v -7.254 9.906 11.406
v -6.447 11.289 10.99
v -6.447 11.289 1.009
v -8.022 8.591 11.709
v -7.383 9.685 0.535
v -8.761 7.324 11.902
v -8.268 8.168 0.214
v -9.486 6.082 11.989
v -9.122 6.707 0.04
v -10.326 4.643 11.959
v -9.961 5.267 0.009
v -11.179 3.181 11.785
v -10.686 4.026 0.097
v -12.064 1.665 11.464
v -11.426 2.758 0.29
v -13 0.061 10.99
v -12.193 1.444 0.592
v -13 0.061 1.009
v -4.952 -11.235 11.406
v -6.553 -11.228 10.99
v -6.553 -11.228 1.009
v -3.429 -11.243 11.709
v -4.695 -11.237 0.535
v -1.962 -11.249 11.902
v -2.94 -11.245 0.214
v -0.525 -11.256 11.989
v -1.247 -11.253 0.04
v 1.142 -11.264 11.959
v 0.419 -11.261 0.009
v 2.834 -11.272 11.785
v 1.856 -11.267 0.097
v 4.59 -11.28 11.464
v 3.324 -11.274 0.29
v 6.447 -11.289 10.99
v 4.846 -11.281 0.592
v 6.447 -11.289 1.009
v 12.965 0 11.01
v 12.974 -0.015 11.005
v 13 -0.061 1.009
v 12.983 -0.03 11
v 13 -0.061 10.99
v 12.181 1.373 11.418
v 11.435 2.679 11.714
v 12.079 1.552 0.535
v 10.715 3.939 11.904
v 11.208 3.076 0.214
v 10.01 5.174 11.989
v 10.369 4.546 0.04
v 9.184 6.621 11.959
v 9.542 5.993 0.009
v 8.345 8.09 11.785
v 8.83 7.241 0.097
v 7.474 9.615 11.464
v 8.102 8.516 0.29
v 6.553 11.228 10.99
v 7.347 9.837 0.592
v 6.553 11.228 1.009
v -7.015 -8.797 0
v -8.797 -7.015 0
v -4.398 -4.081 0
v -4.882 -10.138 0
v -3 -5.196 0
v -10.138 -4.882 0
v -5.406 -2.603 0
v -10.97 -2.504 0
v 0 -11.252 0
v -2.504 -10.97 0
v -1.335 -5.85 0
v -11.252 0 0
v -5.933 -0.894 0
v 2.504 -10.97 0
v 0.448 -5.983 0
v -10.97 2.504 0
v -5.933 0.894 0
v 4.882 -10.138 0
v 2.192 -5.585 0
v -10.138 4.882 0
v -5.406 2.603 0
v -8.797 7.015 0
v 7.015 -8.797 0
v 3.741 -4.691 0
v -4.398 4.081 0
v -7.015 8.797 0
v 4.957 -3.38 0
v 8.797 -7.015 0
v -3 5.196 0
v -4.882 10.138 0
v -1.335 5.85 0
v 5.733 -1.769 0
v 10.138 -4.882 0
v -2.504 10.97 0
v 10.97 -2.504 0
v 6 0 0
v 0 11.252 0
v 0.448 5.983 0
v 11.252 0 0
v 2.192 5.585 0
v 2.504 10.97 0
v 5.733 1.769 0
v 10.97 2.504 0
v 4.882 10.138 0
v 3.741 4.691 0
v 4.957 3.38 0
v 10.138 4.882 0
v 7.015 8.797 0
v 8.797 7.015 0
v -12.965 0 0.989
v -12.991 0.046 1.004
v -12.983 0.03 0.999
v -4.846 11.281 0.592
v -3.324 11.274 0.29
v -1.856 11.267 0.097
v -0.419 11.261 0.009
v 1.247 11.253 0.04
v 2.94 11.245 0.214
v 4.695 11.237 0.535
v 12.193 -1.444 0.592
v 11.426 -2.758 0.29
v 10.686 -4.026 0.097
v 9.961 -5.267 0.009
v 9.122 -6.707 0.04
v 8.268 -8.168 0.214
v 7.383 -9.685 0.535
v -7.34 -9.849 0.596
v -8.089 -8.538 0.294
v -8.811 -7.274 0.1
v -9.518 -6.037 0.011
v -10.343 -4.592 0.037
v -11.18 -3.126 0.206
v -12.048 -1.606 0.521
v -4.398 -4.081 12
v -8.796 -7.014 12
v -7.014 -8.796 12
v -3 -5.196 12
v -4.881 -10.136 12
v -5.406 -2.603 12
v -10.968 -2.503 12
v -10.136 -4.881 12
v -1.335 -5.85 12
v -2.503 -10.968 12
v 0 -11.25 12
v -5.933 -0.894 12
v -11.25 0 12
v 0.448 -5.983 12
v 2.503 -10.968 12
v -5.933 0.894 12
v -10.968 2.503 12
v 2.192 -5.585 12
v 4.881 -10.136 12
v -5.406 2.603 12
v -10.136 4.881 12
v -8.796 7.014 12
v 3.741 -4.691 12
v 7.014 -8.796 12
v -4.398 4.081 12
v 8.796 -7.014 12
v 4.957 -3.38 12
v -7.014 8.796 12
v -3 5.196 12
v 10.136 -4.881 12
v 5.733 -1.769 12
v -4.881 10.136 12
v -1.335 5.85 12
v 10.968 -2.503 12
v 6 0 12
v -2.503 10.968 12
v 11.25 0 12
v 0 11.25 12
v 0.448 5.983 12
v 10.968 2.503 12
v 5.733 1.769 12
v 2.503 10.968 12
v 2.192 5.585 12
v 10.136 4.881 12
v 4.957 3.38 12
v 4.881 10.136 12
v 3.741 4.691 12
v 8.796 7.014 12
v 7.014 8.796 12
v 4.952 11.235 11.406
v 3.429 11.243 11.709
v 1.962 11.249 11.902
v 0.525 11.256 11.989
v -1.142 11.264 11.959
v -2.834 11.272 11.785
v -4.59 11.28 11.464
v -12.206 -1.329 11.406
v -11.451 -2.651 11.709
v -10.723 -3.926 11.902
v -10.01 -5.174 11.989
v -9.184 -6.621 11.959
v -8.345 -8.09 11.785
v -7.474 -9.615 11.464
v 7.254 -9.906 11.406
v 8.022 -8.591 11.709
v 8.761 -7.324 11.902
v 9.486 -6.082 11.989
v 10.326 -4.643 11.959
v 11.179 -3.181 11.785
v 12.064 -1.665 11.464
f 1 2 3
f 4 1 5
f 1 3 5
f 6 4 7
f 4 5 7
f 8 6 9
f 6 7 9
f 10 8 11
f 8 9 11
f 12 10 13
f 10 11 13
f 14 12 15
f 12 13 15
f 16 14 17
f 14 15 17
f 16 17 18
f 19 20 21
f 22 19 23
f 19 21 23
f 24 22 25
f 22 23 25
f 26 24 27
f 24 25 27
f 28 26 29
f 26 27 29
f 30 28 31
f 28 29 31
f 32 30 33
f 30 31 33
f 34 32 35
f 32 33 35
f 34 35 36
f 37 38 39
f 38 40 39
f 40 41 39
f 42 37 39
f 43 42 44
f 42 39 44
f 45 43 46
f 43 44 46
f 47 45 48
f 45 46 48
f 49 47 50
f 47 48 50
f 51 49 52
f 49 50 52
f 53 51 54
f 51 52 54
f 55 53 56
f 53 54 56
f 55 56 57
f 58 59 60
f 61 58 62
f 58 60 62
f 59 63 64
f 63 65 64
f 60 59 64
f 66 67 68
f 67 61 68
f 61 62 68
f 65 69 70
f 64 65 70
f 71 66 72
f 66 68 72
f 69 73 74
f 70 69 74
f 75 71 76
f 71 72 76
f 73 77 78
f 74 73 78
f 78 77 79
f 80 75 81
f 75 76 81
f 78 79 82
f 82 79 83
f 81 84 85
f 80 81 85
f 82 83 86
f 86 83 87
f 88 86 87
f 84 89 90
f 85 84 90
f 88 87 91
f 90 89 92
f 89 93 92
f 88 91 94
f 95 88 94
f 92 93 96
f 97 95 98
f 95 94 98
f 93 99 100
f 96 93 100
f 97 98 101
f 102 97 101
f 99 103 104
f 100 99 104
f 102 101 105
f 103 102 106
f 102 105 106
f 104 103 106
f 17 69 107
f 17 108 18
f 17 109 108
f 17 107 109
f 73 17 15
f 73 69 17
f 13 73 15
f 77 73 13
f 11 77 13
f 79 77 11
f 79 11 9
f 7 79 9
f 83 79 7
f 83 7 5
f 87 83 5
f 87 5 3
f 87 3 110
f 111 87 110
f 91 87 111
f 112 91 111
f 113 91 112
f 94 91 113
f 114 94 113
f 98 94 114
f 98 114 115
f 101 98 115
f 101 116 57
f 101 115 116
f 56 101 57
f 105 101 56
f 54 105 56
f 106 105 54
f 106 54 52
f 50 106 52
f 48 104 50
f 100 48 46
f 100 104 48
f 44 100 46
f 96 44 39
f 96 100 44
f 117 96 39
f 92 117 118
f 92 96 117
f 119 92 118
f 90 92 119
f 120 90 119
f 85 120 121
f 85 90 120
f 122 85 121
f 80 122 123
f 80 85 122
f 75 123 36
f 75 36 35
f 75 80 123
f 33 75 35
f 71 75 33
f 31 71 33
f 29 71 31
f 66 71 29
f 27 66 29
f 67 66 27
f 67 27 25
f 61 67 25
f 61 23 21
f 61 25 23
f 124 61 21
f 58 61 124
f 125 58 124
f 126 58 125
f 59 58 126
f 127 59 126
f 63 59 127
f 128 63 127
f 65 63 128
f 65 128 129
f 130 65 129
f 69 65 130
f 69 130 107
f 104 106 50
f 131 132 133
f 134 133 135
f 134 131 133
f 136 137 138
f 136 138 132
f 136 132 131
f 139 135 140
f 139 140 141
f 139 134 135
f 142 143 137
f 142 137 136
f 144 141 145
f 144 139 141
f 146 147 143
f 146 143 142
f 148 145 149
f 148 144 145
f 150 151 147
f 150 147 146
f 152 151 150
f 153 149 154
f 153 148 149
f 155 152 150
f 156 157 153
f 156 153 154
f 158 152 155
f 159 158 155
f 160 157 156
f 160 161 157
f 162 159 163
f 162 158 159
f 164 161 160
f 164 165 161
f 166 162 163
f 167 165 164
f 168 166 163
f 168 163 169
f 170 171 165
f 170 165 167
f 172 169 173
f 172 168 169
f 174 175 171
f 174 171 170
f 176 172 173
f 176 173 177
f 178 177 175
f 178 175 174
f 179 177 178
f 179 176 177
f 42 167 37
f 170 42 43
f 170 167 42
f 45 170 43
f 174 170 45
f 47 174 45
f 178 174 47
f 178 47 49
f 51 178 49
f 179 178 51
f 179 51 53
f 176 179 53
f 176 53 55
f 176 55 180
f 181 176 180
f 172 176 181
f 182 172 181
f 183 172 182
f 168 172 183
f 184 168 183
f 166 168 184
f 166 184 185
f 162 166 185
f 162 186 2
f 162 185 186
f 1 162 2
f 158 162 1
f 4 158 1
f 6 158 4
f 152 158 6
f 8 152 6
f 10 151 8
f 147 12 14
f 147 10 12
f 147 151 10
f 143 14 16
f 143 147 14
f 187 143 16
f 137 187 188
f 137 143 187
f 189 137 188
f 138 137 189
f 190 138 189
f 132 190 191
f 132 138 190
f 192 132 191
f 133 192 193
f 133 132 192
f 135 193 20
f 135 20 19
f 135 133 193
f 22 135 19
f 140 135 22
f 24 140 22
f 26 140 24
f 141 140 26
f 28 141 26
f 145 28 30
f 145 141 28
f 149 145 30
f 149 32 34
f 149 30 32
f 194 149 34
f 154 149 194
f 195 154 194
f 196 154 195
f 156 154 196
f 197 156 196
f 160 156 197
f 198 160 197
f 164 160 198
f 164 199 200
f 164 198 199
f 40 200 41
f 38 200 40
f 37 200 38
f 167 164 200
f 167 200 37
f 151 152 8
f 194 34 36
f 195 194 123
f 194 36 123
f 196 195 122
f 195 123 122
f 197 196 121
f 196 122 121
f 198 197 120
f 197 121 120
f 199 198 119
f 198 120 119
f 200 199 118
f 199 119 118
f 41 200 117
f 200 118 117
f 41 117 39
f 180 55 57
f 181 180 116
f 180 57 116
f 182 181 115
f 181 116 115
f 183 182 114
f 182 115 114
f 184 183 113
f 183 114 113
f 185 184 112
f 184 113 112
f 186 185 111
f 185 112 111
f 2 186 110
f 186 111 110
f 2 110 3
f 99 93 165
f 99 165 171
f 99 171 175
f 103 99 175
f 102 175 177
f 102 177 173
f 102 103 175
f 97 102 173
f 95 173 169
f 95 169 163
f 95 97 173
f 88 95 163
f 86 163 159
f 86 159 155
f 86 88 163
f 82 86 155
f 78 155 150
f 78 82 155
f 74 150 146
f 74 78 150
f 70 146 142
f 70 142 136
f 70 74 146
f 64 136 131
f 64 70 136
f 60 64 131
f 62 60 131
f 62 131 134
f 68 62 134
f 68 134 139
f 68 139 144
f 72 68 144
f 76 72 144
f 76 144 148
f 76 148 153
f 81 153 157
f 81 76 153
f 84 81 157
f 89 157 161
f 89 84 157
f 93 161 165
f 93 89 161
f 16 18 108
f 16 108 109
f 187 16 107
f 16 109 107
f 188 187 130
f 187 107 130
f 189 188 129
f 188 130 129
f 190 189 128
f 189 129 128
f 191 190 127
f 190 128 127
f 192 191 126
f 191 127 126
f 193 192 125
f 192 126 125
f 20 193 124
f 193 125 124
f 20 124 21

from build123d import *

# Parameters (mm, degrees)
SKETCH1_R           = 6
BOSS_EXTRUDE1_DEPTH = 12
SKETCH2_OUTSIDE_W   = 111.456
SKETCH2_OUTSIDE_H   = 108.034
SKETCH2_OUTSIDE_R   = 11.251897502
CUT_EXTRUDE1_DEPTH  = 21.986591899
CUT_EXTRUDE1_DRAFT  = -60
SKETCH3_OUTSIDE_W   = 111.456
SKETCH3_OUTSIDE_H   = 108.034
SKETCH3_OUTSIDE_R   = 11.25
CUT_EXTRUDE3_DEPTH  = 21.986591899
CUT_EXTRUDE3_DRAFT  = -60


with BuildPart() as part:
    # Sketch1 → Boss-Extrude1 (new body)
    with BuildSketch(Plane.XY):
        Polygon((6.552777772, 11.227858989), (-6.447222228, 11.28880151), (-13, 0.060942521), (-6.552777772, -11.227858989), (6.447222228, -11.28880151), (13, -0.060942521), align=None)
        Circle(SKETCH1_R, mode=Mode.SUBTRACT)
    extrude(amount=BOSS_EXTRUDE1_DEPTH)


with BuildPart() as cut_extrude1_tool:
    # Sketch2 outside → Cut-Extrude1 (with draft: the straight prism first)
    with BuildSketch(Plane(origin=(0, 0, 0), x_dir=(-1, 0, 0), z_dir=(0, 0, -1))):
        Rectangle(SKETCH2_OUTSIDE_W, SKETCH2_OUTSIDE_H)
        Circle(SKETCH2_OUTSIDE_R, mode=Mode.SUBTRACT)
    extrude(amount=-CUT_EXTRUDE1_DEPTH)
    # Cut-Extrude1: the draft: its side faces are tilted about the plane it starts from
    cut_extrude1_sides = [cut_extrude1_tool.faces().sort_by_distance(p)[0] for p in [
        (0, -54.017, 10.993295949),
        (-55.728, 0, 10.993295949),
        (0, 54.017, 10.993295949),
        (55.728, 0, 10.993295949),
        (11.251897502, 0, 10.993295949),
    ]]
    draft(cut_extrude1_sides, Plane(origin=(0, 0, 0), x_dir=(-1, 0, 0), z_dir=(0, 0, -1)), CUT_EXTRUDE1_DRAFT)


with BuildPart() as part_1:
    add(part.part)

    # Cut-Extrude1: cut by cut_extrude1_tool
    add(cut_extrude1_tool.part, mode=Mode.SUBTRACT)


with BuildPart() as cut_extrude3_tool:
    # Sketch3 outside → Cut-Extrude3 (with draft: the straight prism first)
    with BuildSketch(Plane.XY.offset(12)):
        Rectangle(SKETCH3_OUTSIDE_W, SKETCH3_OUTSIDE_H)
        Circle(SKETCH3_OUTSIDE_R, mode=Mode.SUBTRACT)
    extrude(amount=-CUT_EXTRUDE3_DEPTH)
    # Cut-Extrude3: the draft: its side faces are tilted about the plane it starts from
    cut_extrude3_sides = [cut_extrude3_tool.faces().sort_by_distance(p)[0] for p in [
        (0, -54.017, 1.006704051),
        (55.728, 0, 1.006704051),
        (0, 54.017, 1.006704051),
        (-55.728, 0, 1.006704051),
        (-11.25, 0, 1.006704051),
    ]]
    draft(cut_extrude3_sides, Plane.XY.offset(12), CUT_EXTRUDE3_DRAFT)


with BuildPart() as part_2:
    add(part_1.part)

    # Cut-Extrude3: cut by cut_extrude3_tool
    add(cut_extrude3_tool.part, mode=Mode.SUBTRACT)


solid = part_2.part
